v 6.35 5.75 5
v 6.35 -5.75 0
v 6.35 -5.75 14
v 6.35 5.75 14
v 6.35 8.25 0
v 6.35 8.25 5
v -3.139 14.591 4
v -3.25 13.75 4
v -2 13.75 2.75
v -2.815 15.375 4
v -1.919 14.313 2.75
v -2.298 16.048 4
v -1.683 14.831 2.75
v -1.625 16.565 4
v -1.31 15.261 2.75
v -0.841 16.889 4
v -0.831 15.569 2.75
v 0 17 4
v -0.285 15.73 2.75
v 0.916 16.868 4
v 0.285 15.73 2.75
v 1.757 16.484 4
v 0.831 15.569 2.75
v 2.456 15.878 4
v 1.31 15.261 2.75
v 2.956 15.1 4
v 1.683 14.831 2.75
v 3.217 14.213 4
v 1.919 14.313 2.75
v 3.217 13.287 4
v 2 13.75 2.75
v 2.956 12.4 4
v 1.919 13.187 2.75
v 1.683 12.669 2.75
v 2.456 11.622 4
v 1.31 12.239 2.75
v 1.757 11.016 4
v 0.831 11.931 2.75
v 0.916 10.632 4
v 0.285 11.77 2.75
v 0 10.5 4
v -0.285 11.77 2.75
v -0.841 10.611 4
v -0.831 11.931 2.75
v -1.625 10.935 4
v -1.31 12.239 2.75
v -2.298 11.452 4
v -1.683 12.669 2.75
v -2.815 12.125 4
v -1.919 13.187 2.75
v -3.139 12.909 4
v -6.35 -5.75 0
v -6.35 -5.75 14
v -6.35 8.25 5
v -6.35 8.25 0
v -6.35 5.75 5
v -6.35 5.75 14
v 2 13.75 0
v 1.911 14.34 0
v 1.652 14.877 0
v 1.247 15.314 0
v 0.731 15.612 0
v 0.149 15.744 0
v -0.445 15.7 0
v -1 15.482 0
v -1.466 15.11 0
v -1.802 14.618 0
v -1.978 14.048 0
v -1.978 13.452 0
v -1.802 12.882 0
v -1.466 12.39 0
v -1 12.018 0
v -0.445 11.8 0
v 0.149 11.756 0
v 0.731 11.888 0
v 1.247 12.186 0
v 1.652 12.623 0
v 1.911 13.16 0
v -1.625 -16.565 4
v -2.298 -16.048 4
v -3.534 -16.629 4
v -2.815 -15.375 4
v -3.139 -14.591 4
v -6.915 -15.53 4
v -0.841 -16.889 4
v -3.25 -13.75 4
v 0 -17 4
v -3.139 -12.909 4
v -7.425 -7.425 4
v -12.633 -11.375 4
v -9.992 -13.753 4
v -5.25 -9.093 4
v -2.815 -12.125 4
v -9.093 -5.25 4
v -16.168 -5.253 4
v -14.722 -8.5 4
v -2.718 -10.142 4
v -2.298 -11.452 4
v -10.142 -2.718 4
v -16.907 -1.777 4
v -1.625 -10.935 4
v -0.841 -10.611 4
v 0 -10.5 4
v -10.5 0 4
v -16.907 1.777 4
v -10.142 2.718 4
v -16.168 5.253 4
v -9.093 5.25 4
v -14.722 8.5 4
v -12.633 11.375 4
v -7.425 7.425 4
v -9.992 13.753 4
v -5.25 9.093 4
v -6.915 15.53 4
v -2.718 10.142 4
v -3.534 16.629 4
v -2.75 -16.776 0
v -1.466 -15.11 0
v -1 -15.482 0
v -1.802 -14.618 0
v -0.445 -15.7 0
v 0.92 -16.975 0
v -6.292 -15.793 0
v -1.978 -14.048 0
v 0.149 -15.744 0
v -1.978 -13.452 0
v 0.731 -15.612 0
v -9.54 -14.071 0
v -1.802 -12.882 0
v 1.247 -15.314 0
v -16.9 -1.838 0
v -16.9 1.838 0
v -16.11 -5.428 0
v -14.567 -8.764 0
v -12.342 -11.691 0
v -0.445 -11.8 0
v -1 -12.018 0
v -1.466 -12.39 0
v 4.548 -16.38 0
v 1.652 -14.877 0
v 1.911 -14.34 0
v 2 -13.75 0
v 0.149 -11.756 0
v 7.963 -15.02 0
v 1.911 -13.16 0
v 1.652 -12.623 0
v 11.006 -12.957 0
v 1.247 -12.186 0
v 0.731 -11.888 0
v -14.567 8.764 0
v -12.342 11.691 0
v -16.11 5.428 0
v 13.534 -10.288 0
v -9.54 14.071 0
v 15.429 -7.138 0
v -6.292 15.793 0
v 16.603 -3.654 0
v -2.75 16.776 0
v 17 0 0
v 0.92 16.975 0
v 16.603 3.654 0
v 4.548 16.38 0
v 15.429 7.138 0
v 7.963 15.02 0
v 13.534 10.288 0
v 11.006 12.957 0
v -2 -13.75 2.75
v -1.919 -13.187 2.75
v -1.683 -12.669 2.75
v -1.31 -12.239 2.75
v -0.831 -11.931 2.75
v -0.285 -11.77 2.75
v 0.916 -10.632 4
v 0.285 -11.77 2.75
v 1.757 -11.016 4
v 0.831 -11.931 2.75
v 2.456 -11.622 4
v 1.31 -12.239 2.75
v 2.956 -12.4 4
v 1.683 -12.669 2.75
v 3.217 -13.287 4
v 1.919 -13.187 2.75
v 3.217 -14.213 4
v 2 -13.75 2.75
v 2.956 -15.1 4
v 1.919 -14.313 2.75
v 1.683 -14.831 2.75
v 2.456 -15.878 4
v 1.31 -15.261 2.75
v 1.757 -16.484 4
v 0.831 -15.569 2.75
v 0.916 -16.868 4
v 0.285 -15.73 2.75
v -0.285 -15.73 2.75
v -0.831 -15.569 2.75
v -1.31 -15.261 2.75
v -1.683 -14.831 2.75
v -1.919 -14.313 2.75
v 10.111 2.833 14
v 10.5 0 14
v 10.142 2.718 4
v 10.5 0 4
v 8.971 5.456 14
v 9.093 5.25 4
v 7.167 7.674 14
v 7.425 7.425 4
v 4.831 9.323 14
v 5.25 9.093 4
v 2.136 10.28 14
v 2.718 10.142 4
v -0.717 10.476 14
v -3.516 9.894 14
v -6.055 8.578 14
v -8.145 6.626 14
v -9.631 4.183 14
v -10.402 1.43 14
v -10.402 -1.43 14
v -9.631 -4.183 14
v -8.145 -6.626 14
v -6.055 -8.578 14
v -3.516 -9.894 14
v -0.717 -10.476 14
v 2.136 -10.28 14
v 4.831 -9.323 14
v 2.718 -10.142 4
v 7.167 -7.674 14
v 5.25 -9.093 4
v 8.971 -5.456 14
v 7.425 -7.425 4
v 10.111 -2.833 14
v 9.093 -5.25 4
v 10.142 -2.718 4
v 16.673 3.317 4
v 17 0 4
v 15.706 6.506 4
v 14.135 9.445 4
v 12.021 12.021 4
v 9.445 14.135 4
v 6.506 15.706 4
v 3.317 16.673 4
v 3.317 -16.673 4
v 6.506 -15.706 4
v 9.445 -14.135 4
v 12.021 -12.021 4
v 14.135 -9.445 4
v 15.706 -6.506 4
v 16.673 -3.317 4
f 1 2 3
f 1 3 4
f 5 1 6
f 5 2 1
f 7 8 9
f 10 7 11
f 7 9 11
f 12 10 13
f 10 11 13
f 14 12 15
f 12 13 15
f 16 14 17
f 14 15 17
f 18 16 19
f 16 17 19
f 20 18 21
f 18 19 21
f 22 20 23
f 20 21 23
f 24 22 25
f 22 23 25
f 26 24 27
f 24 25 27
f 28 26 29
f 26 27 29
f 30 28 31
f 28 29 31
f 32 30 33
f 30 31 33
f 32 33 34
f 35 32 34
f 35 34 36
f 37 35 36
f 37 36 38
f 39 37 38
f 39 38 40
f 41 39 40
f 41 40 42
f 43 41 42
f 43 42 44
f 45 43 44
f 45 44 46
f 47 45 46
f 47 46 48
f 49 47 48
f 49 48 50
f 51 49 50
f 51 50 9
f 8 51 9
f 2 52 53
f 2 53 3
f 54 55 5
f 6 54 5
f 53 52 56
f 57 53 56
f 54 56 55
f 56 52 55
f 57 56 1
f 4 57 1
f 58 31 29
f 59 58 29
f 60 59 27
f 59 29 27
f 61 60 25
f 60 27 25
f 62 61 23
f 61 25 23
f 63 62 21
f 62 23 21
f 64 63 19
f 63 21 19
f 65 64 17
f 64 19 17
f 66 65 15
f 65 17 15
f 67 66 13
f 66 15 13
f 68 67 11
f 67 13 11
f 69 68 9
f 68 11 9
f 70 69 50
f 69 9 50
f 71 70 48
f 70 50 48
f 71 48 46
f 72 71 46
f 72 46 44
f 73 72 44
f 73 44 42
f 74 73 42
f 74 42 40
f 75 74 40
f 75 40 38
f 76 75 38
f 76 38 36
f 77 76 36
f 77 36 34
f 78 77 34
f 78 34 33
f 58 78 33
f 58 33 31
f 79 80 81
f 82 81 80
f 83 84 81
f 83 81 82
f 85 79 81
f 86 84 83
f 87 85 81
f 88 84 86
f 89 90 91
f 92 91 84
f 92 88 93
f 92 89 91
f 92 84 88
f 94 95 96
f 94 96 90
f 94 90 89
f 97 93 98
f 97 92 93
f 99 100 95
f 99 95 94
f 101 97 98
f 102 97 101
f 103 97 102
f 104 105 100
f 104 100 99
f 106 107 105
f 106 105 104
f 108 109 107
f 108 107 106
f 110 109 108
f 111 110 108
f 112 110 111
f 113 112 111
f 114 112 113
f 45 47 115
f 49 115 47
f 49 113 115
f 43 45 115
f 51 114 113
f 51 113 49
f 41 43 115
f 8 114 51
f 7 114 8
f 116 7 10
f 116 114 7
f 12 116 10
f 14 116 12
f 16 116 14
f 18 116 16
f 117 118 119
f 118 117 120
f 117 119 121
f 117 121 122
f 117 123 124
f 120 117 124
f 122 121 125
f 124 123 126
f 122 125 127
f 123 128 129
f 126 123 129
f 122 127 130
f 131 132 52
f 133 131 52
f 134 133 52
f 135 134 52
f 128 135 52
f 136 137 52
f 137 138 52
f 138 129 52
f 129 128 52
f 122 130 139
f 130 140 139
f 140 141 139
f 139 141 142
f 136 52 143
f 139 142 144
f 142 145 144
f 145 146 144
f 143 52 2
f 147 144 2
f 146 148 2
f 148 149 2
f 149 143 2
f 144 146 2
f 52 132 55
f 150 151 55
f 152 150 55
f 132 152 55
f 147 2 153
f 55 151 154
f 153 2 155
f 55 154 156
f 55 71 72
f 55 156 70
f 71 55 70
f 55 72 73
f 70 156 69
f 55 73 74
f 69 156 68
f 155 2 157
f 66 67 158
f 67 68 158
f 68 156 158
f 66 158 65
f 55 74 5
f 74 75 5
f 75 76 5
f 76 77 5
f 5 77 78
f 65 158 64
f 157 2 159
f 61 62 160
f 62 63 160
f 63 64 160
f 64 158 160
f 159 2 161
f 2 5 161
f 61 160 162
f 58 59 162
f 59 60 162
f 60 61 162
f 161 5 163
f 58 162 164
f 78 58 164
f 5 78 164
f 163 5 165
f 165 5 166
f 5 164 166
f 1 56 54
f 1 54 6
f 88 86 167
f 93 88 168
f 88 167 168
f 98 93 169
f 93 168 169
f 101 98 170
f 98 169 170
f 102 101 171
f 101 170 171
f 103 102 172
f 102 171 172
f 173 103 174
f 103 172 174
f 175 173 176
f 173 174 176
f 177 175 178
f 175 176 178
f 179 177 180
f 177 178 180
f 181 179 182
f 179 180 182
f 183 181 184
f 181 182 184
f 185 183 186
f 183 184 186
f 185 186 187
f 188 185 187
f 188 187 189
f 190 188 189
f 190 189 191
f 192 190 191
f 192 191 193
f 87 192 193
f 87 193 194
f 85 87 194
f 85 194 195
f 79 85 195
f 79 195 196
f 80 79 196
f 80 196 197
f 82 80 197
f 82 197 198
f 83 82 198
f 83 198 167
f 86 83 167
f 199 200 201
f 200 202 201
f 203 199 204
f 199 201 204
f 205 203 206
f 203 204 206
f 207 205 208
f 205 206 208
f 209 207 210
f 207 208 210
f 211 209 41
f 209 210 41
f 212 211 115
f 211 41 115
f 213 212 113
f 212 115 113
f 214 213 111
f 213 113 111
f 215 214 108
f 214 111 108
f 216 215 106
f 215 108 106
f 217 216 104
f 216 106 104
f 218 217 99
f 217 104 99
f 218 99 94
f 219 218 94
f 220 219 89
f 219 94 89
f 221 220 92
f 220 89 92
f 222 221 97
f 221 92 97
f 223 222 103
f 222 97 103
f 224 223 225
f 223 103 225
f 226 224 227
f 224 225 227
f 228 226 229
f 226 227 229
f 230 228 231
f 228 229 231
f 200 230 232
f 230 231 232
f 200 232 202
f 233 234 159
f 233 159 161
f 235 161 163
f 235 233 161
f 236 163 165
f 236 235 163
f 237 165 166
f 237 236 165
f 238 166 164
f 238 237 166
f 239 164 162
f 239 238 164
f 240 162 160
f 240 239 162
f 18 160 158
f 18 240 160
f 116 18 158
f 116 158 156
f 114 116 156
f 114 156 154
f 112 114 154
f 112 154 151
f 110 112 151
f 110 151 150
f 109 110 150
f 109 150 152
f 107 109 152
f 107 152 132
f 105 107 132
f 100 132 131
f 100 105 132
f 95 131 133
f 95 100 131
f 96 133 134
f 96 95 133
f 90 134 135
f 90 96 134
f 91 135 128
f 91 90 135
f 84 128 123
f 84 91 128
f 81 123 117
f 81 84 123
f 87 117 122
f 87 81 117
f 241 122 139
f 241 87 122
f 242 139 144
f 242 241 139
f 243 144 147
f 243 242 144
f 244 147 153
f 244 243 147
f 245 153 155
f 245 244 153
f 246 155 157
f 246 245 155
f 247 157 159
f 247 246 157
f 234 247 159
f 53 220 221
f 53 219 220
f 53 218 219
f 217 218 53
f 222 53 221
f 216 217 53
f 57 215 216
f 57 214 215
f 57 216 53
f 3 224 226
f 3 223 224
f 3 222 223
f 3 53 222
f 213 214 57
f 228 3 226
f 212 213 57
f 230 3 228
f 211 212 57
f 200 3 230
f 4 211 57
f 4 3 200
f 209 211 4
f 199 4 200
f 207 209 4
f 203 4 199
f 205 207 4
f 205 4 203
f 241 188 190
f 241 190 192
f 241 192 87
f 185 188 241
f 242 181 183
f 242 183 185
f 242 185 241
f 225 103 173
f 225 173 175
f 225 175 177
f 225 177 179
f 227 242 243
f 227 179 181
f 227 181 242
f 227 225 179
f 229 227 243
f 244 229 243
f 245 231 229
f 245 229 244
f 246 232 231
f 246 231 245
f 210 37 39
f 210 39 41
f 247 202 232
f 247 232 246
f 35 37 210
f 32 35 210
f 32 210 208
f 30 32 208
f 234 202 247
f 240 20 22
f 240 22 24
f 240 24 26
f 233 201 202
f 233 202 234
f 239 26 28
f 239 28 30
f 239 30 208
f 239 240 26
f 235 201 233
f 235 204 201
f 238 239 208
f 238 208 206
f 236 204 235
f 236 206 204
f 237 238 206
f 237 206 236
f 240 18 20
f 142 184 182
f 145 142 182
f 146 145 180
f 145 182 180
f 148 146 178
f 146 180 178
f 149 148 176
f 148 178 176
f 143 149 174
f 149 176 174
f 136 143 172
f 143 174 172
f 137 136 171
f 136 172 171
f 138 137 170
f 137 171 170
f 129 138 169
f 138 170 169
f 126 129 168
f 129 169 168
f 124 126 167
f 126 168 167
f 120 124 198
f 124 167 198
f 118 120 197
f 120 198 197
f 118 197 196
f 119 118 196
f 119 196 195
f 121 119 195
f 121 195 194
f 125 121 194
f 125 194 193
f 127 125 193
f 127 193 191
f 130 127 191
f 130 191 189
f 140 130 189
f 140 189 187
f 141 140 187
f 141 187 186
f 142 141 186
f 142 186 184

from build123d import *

# Parameters (mm, degrees)
F0_R           = 10.5
F0_W           = 12.7
F0_H           = 11.5
F1_DEPTH       = 14
F4_R           = 17
F4_R_2         = 2
F4_R_3         = 9.1303140993
F5_DEPTH       = 4
F2_W           = 12.7
F2_H           = 2.5
F6_DEPTH       = 5
F7_D           = 4
F7_DEPTH       = 10
F7_CSINK_D     = 6.5
F7_CSINK_ANGLE = 90
F7_TIP         = 1.2017212381


with BuildPart() as f1:
    # F0 (on Top) → F1 (new body)
    with BuildSketch(Plane.XY):
        Circle(F0_R)
        Rectangle(F0_W, F0_H, mode=Mode.SUBTRACT)
    extrude(amount=F1_DEPTH)

    # F4 (on offset) → F5 (join)
    with BuildSketch(Plane.XY.offset(4)):
        Circle(F4_R)
        with Locations((0, -13.75)):
            Circle(F4_R_2, mode=Mode.SUBTRACT)
        Circle(F4_R_3, mode=Mode.SUBTRACT)
        with Locations((0, 13.75)):
            Circle(F4_R_2, mode=Mode.SUBTRACT)
    extrude(amount=-F5_DEPTH)

    # F2 (on face) → F6 (cut)
    with BuildSketch(Plane(origin=(0, 0, 0), x_dir=(1, 0, 0), z_dir=(0, 0, -1))):
        with Locations((0, -7)):
            Rectangle(F2_W, F2_H)
    extrude(amount=-F6_DEPTH, mode=Mode.SUBTRACT)

    # F7
    with Locations(Plane.XY.offset(4)):
        with Locations((0, 13.75), (0, -13.75)):
            CounterSinkHole(F7_D / 2, F7_CSINK_D / 2, depth=F7_DEPTH, counter_sink_angle=F7_CSINK_ANGLE)
            with Locations((0, 0, -(F7_DEPTH + F7_TIP / 2))):  # 118° drill point
                Cone(0, F7_D / 2, F7_TIP, mode=Mode.SUBTRACT)


solid = f1.part
